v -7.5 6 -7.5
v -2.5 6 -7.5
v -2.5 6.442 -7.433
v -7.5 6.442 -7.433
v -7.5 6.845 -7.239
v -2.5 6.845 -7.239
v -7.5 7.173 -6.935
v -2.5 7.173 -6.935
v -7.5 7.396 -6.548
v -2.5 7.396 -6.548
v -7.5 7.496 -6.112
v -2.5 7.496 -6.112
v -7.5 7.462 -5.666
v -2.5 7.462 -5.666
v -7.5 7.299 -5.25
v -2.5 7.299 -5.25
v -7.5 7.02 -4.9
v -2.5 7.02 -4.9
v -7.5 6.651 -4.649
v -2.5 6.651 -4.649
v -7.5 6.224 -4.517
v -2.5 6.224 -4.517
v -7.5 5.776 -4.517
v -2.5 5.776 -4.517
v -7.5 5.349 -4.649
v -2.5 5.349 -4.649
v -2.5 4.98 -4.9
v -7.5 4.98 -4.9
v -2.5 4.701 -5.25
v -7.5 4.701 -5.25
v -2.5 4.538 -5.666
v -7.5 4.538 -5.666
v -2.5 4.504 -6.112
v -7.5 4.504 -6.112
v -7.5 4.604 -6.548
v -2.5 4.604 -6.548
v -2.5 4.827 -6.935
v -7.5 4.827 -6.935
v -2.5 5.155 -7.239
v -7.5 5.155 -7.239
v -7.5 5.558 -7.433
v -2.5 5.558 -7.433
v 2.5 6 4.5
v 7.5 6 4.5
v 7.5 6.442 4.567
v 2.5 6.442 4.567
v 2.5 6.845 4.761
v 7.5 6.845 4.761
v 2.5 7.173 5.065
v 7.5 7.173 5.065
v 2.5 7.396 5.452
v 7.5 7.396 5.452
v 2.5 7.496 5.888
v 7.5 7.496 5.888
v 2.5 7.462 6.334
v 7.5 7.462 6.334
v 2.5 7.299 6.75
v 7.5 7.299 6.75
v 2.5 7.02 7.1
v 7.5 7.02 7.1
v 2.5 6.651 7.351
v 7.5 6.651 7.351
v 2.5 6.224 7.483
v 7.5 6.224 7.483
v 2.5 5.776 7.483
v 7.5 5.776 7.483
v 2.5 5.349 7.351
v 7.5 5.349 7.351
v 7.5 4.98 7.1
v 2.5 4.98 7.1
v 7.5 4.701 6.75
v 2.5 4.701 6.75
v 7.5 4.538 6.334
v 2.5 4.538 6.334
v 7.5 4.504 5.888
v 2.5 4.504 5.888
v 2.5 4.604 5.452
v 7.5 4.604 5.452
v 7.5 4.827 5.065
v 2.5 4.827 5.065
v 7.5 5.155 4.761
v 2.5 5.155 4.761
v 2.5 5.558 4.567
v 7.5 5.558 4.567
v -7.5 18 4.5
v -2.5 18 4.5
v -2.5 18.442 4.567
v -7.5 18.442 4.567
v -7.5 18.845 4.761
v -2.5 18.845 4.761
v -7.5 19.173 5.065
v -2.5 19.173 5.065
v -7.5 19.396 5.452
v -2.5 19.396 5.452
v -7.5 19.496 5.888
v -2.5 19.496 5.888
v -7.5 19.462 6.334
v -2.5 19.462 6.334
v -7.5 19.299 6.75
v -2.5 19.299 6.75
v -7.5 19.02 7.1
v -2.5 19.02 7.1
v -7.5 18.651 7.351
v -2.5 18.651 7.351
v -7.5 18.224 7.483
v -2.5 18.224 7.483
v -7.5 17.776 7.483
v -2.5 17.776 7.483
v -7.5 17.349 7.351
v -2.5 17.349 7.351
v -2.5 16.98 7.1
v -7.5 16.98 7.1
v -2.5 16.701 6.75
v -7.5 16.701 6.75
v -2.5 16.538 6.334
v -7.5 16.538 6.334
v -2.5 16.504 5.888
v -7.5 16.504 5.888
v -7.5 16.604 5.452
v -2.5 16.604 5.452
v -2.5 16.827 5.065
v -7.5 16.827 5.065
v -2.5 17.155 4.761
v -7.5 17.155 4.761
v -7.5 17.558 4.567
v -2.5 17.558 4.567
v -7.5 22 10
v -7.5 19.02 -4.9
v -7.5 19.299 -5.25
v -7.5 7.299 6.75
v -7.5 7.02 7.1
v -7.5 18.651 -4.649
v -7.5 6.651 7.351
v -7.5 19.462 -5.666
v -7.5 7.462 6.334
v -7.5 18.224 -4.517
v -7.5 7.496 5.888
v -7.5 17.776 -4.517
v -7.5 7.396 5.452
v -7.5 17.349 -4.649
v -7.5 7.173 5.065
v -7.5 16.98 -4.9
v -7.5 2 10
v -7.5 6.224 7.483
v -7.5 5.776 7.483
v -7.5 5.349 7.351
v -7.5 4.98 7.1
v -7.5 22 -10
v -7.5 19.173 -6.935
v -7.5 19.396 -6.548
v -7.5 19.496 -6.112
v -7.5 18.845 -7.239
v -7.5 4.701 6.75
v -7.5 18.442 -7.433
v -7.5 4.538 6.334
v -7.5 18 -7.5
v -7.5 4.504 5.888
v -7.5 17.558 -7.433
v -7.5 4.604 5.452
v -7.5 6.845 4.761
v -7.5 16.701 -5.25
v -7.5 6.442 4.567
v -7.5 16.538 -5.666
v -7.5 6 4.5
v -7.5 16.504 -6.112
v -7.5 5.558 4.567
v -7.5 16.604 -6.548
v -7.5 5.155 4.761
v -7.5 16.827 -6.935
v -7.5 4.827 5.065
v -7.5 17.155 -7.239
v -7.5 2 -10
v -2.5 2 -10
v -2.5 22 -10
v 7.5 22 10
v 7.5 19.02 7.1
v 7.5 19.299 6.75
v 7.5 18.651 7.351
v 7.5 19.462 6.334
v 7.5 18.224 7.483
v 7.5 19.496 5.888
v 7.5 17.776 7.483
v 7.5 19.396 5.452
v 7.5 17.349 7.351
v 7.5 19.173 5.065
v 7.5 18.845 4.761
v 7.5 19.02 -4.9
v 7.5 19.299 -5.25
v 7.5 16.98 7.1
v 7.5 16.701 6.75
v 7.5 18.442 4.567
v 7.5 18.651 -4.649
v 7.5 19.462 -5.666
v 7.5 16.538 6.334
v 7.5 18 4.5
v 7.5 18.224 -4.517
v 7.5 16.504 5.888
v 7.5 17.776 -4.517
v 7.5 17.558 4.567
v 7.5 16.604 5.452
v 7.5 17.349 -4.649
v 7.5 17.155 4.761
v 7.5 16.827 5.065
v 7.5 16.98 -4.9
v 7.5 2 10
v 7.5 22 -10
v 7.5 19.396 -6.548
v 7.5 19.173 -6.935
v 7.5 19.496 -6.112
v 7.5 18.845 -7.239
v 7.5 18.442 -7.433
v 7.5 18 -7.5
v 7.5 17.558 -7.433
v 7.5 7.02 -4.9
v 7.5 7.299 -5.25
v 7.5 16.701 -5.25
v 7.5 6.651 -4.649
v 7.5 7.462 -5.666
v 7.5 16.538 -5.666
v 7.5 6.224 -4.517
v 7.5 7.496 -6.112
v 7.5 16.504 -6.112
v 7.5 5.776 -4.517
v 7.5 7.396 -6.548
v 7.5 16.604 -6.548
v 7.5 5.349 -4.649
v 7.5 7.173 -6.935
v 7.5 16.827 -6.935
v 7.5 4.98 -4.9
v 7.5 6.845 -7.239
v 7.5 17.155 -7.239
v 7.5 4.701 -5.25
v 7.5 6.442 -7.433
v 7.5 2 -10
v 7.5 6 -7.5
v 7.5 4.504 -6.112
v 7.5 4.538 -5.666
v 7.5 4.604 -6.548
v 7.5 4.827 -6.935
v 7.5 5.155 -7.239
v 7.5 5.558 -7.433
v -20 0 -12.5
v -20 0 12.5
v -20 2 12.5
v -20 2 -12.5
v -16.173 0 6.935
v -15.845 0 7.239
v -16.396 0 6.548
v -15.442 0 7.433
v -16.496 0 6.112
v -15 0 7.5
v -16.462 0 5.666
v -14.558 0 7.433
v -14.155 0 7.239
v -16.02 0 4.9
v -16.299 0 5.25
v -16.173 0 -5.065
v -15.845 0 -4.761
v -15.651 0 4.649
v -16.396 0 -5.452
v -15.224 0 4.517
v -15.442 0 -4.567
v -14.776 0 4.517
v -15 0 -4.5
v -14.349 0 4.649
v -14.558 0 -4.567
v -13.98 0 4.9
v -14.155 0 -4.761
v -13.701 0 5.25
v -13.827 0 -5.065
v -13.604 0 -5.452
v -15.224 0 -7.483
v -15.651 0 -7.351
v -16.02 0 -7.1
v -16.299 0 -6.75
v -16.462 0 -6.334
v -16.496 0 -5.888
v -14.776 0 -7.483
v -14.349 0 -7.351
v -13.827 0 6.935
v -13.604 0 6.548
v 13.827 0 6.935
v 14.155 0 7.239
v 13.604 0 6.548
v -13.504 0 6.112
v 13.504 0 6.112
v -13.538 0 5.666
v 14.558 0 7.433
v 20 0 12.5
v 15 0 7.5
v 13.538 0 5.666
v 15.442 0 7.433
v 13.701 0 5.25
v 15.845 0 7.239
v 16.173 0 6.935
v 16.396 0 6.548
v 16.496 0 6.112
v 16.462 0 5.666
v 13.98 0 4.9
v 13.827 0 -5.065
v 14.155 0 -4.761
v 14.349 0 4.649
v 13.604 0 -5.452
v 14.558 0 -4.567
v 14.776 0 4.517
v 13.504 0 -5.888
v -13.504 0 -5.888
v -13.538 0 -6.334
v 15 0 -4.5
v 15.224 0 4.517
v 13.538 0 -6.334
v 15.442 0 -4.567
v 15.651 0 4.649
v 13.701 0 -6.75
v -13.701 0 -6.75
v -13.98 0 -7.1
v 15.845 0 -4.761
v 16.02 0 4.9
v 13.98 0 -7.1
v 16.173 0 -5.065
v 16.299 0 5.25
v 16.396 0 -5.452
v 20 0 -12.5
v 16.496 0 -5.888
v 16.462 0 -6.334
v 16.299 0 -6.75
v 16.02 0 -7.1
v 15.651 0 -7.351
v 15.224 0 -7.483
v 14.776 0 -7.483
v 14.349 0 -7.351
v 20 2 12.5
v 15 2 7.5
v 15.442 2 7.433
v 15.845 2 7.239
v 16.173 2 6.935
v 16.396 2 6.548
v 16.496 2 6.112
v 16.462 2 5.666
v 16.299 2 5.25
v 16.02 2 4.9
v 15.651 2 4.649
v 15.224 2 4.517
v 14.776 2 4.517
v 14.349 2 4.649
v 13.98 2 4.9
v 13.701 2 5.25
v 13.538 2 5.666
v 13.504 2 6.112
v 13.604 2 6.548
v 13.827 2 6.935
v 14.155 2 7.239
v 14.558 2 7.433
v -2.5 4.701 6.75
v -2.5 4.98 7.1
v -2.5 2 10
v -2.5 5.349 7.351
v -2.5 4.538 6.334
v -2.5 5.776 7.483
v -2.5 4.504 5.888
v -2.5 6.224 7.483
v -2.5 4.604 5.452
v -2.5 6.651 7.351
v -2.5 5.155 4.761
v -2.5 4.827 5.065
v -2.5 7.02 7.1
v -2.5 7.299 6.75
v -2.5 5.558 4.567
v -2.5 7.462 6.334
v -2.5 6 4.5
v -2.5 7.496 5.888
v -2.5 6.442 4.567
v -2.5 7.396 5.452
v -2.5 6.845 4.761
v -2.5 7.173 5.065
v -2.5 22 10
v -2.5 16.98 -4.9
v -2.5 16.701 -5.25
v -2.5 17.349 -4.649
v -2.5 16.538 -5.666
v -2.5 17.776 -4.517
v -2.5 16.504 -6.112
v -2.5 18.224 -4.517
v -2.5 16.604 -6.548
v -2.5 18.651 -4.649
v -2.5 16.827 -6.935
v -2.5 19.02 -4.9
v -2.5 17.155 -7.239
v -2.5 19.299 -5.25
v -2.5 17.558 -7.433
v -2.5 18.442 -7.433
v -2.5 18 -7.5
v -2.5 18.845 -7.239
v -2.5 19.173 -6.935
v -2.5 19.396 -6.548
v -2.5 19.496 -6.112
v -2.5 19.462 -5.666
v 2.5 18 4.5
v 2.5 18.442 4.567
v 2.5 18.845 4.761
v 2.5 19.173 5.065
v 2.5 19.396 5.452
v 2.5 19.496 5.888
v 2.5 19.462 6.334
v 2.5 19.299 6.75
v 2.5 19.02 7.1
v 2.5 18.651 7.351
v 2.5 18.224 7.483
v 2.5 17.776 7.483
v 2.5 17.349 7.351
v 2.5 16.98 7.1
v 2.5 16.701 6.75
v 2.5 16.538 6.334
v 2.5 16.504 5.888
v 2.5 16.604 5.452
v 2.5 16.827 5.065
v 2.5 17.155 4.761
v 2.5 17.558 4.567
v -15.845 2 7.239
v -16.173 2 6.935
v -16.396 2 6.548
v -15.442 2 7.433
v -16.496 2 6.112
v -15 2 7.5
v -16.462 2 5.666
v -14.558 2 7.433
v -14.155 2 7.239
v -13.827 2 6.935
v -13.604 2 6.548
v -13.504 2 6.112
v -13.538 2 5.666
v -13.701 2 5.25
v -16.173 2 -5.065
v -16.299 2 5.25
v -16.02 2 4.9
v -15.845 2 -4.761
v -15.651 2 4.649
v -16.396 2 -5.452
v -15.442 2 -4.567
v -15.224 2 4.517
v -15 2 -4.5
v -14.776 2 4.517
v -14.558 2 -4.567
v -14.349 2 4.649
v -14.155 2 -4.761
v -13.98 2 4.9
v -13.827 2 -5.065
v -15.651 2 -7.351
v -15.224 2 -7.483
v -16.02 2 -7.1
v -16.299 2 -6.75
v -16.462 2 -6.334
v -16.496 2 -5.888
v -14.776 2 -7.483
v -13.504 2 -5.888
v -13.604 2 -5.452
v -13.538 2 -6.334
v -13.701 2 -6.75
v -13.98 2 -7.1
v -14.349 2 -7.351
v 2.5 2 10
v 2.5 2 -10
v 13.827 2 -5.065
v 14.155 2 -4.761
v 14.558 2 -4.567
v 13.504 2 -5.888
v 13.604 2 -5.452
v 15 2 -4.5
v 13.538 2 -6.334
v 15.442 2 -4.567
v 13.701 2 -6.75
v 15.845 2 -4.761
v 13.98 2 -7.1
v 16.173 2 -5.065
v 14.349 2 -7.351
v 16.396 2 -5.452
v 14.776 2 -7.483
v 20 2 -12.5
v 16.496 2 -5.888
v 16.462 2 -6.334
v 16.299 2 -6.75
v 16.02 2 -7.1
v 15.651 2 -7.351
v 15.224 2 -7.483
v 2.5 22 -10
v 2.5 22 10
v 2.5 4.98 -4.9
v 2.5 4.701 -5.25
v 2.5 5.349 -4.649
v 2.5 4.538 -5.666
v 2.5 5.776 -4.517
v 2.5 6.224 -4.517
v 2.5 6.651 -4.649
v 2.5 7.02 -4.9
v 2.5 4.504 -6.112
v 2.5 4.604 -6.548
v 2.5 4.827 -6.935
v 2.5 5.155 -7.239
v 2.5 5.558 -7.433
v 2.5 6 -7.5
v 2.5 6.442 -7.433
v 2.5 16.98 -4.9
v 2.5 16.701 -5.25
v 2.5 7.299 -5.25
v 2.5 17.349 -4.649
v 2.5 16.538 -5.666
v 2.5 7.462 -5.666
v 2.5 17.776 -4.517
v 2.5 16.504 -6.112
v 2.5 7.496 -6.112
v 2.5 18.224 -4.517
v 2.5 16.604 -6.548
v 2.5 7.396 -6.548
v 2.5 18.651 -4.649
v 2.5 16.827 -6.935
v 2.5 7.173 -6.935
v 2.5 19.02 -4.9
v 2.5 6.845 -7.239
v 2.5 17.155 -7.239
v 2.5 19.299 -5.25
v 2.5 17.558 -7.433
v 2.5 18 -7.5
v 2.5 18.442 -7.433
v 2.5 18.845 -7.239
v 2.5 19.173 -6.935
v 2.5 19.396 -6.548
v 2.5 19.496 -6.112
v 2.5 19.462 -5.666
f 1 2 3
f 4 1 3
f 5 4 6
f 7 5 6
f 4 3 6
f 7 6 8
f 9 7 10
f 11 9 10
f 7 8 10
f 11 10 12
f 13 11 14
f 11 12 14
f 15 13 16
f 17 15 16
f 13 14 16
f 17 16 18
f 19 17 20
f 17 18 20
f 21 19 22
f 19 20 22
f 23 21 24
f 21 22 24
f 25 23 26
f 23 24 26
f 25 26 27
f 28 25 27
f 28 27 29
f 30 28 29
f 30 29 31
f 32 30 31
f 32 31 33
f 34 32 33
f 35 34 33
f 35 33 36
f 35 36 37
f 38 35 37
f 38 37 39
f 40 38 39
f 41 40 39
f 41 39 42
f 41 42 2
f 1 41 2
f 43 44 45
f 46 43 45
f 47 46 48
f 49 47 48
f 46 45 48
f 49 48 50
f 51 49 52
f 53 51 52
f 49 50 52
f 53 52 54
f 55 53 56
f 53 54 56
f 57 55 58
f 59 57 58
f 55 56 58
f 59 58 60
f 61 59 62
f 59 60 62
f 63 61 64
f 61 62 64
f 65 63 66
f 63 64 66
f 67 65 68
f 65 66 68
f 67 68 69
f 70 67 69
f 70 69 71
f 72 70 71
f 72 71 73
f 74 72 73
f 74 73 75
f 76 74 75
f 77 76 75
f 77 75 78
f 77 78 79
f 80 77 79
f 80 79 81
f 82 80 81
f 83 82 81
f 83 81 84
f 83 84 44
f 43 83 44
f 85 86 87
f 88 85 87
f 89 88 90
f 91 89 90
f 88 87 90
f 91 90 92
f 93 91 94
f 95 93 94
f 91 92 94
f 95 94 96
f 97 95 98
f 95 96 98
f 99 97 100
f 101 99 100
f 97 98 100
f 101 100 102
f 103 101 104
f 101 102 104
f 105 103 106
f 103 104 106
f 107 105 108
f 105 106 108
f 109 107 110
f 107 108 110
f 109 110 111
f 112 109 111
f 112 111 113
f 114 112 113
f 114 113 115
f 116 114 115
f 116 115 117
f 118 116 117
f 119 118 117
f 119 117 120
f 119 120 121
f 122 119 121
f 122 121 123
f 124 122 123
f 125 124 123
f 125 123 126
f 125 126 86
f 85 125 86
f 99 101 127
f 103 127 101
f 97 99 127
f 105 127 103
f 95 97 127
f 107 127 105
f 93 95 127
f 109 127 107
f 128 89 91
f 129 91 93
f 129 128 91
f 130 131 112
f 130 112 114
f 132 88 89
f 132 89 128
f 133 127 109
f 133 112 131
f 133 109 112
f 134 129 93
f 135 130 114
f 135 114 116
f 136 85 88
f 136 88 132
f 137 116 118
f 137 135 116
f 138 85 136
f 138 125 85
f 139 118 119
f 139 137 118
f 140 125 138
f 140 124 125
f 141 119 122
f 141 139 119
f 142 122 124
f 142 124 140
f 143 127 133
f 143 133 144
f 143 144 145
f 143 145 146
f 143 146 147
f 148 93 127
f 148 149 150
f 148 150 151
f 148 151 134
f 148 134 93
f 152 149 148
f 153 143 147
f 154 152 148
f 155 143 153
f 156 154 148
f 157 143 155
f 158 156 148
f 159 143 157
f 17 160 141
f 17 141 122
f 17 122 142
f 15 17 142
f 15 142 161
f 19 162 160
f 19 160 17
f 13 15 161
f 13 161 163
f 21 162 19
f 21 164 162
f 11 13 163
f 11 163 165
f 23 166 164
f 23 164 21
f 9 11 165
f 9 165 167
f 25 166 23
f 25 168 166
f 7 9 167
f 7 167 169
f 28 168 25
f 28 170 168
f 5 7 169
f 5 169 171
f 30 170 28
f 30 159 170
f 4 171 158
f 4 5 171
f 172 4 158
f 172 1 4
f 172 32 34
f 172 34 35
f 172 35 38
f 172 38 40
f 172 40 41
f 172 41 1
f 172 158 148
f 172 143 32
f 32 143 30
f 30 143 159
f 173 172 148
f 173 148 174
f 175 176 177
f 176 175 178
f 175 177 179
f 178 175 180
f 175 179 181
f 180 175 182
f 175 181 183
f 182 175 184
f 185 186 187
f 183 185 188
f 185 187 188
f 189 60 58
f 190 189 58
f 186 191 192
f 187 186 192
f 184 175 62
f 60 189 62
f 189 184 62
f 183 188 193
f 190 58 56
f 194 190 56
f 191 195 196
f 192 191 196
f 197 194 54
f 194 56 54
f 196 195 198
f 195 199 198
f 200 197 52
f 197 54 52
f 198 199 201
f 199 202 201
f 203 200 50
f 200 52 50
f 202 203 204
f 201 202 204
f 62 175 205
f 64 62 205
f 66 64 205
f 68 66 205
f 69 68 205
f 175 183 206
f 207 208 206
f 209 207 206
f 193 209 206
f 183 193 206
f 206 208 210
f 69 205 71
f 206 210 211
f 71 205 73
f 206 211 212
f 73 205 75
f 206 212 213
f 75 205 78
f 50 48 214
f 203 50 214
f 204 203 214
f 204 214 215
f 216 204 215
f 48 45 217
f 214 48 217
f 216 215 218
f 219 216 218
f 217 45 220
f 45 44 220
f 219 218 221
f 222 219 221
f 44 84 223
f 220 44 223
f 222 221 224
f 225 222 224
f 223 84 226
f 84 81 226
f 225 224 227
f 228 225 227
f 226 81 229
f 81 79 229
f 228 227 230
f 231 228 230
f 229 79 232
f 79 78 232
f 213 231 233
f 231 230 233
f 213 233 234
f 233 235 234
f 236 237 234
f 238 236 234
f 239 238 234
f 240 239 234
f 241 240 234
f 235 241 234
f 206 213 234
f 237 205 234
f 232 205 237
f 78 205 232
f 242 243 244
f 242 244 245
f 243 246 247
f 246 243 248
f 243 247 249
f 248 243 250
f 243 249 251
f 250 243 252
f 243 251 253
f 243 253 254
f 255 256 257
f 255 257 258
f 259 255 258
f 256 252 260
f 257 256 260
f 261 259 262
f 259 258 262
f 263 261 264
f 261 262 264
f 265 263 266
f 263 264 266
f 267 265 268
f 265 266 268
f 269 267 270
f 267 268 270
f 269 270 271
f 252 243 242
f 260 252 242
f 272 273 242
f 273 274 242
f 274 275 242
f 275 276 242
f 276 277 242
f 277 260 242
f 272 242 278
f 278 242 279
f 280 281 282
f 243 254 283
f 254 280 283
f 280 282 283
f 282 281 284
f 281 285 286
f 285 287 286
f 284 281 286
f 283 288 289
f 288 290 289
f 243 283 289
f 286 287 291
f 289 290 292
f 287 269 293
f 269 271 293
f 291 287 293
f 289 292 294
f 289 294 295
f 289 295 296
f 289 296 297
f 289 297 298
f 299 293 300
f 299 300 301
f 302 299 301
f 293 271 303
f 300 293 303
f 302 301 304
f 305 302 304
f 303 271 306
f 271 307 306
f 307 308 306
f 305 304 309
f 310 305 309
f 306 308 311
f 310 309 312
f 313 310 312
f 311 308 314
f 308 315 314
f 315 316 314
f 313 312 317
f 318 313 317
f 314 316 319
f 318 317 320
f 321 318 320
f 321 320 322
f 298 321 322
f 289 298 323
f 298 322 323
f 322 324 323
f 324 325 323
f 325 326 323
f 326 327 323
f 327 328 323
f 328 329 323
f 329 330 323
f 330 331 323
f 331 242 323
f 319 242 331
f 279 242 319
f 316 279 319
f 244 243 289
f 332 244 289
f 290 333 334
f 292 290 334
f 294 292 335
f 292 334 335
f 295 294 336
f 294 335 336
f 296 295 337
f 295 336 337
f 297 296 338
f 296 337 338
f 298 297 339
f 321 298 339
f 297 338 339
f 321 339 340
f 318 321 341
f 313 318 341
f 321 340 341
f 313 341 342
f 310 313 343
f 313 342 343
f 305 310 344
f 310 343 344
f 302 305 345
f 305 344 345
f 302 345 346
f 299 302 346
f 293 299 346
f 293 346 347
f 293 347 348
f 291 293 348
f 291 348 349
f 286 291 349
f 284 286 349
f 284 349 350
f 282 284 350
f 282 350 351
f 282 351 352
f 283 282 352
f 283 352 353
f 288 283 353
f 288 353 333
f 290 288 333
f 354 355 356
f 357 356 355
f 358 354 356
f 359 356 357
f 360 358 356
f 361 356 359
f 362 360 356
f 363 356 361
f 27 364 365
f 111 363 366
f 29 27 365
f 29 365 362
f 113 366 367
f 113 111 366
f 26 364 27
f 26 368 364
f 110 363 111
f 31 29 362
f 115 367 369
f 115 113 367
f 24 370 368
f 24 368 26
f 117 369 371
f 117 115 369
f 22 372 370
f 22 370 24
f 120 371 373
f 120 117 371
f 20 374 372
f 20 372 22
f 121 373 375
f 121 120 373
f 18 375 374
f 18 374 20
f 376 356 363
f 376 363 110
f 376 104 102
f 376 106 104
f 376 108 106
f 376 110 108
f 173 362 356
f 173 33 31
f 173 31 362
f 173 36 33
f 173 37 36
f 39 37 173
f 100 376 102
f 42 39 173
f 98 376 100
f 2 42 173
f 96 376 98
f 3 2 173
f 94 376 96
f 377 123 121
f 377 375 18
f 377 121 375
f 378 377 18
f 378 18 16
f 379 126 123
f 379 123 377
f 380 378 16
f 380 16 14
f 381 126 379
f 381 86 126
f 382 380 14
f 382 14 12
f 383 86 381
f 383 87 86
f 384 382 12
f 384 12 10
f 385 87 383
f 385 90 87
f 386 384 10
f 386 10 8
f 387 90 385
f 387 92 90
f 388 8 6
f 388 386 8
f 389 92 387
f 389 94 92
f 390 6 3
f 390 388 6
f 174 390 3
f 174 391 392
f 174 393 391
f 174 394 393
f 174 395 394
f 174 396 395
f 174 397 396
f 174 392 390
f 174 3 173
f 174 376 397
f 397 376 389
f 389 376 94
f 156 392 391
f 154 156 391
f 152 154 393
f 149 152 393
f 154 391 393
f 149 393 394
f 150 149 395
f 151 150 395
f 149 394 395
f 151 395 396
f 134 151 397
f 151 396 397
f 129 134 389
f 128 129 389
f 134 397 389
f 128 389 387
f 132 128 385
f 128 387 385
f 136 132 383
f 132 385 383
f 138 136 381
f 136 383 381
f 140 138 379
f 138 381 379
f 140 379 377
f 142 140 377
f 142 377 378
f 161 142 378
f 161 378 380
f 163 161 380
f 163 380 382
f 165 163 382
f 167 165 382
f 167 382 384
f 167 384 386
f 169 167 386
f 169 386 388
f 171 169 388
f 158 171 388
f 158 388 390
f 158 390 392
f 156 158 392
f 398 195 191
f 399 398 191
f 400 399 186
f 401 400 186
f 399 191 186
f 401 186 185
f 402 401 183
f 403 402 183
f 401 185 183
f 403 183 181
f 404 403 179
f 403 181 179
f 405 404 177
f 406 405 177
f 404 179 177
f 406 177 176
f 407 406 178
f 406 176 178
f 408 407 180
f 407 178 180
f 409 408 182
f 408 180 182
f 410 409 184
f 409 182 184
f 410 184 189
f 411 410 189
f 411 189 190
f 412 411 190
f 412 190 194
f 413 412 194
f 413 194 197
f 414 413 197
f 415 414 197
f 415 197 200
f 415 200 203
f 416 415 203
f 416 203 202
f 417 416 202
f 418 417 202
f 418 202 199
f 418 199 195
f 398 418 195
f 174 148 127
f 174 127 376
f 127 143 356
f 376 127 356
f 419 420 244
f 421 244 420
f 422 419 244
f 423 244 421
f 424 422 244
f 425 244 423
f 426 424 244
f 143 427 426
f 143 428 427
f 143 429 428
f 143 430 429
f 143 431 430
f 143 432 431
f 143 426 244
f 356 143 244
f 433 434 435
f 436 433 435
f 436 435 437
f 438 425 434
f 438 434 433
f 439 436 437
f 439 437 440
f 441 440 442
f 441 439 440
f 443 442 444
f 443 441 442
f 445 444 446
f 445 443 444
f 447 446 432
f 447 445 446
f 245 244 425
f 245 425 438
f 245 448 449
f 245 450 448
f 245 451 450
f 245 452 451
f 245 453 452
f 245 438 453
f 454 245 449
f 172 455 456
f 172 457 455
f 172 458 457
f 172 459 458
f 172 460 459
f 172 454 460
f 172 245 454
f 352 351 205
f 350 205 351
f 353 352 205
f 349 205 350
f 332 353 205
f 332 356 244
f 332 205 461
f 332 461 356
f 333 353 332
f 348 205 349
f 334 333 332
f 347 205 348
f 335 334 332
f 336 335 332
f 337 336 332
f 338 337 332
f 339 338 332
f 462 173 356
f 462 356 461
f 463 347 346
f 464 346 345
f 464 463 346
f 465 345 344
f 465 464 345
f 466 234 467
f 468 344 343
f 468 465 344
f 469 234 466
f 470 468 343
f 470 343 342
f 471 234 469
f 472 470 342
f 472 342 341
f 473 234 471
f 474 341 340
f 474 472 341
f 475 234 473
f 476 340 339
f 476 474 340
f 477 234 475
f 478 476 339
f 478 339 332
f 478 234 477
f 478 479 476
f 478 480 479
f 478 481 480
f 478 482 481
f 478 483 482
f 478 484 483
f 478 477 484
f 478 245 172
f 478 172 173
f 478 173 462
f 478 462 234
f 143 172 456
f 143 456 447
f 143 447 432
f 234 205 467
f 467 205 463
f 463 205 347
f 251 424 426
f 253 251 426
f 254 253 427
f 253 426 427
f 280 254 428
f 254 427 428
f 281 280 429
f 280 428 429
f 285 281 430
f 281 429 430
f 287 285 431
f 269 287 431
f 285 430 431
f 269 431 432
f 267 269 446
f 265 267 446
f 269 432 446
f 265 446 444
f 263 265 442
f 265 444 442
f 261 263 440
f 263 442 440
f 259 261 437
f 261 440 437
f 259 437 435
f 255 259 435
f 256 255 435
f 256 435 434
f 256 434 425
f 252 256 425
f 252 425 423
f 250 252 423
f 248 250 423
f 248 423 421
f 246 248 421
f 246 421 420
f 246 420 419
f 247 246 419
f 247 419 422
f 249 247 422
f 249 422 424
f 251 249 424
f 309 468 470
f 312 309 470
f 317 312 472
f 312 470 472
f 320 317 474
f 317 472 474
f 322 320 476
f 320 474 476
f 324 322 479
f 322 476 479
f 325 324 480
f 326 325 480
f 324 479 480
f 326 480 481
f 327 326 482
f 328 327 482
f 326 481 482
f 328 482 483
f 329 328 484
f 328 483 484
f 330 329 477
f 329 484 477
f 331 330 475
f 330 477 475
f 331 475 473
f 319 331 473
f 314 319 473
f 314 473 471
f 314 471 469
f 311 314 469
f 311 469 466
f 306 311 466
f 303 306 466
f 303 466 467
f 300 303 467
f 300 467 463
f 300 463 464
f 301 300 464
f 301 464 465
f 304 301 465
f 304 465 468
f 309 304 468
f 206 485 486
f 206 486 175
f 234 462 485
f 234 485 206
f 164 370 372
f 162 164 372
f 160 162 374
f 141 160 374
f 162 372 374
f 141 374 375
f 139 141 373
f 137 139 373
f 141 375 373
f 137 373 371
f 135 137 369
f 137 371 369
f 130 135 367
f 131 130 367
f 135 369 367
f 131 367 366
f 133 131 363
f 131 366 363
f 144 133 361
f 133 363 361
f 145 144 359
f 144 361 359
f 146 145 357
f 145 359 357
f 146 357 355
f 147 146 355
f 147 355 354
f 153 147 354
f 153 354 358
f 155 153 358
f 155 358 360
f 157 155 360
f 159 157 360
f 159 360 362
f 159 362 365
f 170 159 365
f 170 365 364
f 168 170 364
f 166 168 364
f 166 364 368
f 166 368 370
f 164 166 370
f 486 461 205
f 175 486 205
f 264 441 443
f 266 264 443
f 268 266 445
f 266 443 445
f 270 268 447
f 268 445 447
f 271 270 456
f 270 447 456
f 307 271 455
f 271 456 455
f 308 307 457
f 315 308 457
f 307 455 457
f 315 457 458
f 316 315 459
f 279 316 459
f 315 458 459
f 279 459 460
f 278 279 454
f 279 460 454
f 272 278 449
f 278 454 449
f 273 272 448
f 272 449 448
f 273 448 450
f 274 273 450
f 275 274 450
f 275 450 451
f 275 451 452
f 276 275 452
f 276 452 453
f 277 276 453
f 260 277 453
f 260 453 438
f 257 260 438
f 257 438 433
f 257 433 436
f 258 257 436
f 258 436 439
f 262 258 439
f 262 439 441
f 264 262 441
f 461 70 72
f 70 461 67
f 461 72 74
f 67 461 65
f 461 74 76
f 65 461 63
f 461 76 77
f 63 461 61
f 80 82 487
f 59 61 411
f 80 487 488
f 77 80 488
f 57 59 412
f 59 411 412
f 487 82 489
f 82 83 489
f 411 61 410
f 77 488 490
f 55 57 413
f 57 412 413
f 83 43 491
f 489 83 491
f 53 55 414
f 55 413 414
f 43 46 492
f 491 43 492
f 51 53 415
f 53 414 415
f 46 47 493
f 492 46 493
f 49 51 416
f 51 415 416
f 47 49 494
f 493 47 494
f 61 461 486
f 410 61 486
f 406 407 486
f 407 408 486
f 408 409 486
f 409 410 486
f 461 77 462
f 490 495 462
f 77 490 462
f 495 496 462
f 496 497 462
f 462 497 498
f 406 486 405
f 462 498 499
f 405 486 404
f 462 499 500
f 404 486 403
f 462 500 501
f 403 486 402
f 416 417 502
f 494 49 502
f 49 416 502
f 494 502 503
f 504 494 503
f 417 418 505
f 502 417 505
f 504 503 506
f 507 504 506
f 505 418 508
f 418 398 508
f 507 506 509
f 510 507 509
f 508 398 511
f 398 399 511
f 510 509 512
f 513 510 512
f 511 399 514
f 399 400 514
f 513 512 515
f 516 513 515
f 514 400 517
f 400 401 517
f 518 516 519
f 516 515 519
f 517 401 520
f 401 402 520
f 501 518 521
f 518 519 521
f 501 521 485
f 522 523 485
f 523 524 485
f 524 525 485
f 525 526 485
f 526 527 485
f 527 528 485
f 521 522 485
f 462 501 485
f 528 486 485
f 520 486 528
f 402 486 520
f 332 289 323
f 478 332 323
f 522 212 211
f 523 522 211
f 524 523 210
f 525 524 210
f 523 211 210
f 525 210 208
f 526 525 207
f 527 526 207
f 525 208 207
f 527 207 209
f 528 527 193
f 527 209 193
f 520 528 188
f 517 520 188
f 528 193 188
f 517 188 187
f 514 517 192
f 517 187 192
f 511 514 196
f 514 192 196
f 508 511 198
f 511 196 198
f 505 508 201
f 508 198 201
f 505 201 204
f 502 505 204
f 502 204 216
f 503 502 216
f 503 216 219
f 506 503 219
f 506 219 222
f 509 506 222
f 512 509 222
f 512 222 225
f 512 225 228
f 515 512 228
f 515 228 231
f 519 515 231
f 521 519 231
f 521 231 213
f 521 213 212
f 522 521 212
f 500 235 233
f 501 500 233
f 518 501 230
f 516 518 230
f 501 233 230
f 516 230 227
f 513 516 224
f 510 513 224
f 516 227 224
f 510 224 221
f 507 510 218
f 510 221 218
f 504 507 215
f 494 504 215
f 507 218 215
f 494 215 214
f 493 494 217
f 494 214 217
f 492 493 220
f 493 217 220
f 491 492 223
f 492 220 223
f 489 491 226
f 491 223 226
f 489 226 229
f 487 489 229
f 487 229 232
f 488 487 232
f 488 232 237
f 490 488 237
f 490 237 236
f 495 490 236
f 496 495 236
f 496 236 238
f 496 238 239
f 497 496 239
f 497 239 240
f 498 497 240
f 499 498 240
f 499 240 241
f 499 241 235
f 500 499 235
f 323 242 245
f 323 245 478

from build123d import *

# Parameters (mm, degrees)
SKETCH_1_W          = 40
SKETCH_1_H          = 25
EXTRUDE_2_DEPTH     = 2
SKETCH_3_W          = 15
SKETCH_3_H          = 20
EXTRUDE_3_DEPTH     = 20
SKETCH_4_W          = 5
SKETCH_4_H          = 20
CUT_EXTRUDE_1_DEPTH = 20
SKETCH_5_R          = 1.5
CUT_EXTRUDE_2_DEPTH = 15
SKETCH_6_R          = 1.5
CUT_EXTRUDE_3_DEPTH = 15


with BuildPart() as part:
    # 草图1 → 凸台-拉伸2 (new body)
    with BuildSketch(Plane(origin=(0, 0, 0), x_dir=(1, 0, 0), z_dir=(0, 1, 0))):
        Rectangle(SKETCH_1_W, SKETCH_1_H)
    extrude(amount=EXTRUDE_2_DEPTH)

    # 草图3 → 凸台-拉伸3 (add)
    with BuildSketch(Plane(origin=(0, 2, 0), x_dir=(1, 0, 0), z_dir=(0, 1, 0))):
        Rectangle(SKETCH_3_W, SKETCH_3_H)
    extrude(amount=EXTRUDE_3_DEPTH)

    # 草图4 → 切除-拉伸1 (cut)
    with BuildSketch(Plane(origin=(0, 22, 0), x_dir=(1, 0, 0), z_dir=(0, 1, 0))):
        Rectangle(SKETCH_4_W, SKETCH_4_H)
    extrude(amount=-CUT_EXTRUDE_1_DEPTH, mode=Mode.SUBTRACT)

    # 草图5 → 切除-拉伸2 (cut)
    with BuildSketch(Plane(origin=(7.5, 0, 0), x_dir=(0, 0, -1), z_dir=(1, 0, 0))):
        with Locations((-6, 18)):
            Circle(SKETCH_5_R)
        with Locations((6, 18)):
            Circle(SKETCH_5_R)
        with Locations((-6, 6)):
            Circle(SKETCH_5_R)
        with Locations((6, 6)):
            Circle(SKETCH_5_R)
    extrude(amount=-CUT_EXTRUDE_2_DEPTH, mode=Mode.SUBTRACT)

    # 草图6 → 切除-拉伸3 (cut)
    with BuildSketch(Plane(origin=(0, 2, 0), x_dir=(1, 0, 0), z_dir=(0, 1, 0))):
        with Locations(Location((-15, 6, 0), (0, 0, 270))):
            Circle(SKETCH_6_R)
        with Locations(Location((-15, -6, 0), (0, 0, 270))):
            Circle(SKETCH_6_R)
        with Locations(Location((15, 6, 0), (0, 0, 270))):
            Circle(SKETCH_6_R)
        with Locations(Location((15, -6, 0), (0, 0, 270))):
            Circle(SKETCH_6_R)
    extrude(amount=-CUT_EXTRUDE_3_DEPTH, mode=Mode.SUBTRACT)


solid = part.part
